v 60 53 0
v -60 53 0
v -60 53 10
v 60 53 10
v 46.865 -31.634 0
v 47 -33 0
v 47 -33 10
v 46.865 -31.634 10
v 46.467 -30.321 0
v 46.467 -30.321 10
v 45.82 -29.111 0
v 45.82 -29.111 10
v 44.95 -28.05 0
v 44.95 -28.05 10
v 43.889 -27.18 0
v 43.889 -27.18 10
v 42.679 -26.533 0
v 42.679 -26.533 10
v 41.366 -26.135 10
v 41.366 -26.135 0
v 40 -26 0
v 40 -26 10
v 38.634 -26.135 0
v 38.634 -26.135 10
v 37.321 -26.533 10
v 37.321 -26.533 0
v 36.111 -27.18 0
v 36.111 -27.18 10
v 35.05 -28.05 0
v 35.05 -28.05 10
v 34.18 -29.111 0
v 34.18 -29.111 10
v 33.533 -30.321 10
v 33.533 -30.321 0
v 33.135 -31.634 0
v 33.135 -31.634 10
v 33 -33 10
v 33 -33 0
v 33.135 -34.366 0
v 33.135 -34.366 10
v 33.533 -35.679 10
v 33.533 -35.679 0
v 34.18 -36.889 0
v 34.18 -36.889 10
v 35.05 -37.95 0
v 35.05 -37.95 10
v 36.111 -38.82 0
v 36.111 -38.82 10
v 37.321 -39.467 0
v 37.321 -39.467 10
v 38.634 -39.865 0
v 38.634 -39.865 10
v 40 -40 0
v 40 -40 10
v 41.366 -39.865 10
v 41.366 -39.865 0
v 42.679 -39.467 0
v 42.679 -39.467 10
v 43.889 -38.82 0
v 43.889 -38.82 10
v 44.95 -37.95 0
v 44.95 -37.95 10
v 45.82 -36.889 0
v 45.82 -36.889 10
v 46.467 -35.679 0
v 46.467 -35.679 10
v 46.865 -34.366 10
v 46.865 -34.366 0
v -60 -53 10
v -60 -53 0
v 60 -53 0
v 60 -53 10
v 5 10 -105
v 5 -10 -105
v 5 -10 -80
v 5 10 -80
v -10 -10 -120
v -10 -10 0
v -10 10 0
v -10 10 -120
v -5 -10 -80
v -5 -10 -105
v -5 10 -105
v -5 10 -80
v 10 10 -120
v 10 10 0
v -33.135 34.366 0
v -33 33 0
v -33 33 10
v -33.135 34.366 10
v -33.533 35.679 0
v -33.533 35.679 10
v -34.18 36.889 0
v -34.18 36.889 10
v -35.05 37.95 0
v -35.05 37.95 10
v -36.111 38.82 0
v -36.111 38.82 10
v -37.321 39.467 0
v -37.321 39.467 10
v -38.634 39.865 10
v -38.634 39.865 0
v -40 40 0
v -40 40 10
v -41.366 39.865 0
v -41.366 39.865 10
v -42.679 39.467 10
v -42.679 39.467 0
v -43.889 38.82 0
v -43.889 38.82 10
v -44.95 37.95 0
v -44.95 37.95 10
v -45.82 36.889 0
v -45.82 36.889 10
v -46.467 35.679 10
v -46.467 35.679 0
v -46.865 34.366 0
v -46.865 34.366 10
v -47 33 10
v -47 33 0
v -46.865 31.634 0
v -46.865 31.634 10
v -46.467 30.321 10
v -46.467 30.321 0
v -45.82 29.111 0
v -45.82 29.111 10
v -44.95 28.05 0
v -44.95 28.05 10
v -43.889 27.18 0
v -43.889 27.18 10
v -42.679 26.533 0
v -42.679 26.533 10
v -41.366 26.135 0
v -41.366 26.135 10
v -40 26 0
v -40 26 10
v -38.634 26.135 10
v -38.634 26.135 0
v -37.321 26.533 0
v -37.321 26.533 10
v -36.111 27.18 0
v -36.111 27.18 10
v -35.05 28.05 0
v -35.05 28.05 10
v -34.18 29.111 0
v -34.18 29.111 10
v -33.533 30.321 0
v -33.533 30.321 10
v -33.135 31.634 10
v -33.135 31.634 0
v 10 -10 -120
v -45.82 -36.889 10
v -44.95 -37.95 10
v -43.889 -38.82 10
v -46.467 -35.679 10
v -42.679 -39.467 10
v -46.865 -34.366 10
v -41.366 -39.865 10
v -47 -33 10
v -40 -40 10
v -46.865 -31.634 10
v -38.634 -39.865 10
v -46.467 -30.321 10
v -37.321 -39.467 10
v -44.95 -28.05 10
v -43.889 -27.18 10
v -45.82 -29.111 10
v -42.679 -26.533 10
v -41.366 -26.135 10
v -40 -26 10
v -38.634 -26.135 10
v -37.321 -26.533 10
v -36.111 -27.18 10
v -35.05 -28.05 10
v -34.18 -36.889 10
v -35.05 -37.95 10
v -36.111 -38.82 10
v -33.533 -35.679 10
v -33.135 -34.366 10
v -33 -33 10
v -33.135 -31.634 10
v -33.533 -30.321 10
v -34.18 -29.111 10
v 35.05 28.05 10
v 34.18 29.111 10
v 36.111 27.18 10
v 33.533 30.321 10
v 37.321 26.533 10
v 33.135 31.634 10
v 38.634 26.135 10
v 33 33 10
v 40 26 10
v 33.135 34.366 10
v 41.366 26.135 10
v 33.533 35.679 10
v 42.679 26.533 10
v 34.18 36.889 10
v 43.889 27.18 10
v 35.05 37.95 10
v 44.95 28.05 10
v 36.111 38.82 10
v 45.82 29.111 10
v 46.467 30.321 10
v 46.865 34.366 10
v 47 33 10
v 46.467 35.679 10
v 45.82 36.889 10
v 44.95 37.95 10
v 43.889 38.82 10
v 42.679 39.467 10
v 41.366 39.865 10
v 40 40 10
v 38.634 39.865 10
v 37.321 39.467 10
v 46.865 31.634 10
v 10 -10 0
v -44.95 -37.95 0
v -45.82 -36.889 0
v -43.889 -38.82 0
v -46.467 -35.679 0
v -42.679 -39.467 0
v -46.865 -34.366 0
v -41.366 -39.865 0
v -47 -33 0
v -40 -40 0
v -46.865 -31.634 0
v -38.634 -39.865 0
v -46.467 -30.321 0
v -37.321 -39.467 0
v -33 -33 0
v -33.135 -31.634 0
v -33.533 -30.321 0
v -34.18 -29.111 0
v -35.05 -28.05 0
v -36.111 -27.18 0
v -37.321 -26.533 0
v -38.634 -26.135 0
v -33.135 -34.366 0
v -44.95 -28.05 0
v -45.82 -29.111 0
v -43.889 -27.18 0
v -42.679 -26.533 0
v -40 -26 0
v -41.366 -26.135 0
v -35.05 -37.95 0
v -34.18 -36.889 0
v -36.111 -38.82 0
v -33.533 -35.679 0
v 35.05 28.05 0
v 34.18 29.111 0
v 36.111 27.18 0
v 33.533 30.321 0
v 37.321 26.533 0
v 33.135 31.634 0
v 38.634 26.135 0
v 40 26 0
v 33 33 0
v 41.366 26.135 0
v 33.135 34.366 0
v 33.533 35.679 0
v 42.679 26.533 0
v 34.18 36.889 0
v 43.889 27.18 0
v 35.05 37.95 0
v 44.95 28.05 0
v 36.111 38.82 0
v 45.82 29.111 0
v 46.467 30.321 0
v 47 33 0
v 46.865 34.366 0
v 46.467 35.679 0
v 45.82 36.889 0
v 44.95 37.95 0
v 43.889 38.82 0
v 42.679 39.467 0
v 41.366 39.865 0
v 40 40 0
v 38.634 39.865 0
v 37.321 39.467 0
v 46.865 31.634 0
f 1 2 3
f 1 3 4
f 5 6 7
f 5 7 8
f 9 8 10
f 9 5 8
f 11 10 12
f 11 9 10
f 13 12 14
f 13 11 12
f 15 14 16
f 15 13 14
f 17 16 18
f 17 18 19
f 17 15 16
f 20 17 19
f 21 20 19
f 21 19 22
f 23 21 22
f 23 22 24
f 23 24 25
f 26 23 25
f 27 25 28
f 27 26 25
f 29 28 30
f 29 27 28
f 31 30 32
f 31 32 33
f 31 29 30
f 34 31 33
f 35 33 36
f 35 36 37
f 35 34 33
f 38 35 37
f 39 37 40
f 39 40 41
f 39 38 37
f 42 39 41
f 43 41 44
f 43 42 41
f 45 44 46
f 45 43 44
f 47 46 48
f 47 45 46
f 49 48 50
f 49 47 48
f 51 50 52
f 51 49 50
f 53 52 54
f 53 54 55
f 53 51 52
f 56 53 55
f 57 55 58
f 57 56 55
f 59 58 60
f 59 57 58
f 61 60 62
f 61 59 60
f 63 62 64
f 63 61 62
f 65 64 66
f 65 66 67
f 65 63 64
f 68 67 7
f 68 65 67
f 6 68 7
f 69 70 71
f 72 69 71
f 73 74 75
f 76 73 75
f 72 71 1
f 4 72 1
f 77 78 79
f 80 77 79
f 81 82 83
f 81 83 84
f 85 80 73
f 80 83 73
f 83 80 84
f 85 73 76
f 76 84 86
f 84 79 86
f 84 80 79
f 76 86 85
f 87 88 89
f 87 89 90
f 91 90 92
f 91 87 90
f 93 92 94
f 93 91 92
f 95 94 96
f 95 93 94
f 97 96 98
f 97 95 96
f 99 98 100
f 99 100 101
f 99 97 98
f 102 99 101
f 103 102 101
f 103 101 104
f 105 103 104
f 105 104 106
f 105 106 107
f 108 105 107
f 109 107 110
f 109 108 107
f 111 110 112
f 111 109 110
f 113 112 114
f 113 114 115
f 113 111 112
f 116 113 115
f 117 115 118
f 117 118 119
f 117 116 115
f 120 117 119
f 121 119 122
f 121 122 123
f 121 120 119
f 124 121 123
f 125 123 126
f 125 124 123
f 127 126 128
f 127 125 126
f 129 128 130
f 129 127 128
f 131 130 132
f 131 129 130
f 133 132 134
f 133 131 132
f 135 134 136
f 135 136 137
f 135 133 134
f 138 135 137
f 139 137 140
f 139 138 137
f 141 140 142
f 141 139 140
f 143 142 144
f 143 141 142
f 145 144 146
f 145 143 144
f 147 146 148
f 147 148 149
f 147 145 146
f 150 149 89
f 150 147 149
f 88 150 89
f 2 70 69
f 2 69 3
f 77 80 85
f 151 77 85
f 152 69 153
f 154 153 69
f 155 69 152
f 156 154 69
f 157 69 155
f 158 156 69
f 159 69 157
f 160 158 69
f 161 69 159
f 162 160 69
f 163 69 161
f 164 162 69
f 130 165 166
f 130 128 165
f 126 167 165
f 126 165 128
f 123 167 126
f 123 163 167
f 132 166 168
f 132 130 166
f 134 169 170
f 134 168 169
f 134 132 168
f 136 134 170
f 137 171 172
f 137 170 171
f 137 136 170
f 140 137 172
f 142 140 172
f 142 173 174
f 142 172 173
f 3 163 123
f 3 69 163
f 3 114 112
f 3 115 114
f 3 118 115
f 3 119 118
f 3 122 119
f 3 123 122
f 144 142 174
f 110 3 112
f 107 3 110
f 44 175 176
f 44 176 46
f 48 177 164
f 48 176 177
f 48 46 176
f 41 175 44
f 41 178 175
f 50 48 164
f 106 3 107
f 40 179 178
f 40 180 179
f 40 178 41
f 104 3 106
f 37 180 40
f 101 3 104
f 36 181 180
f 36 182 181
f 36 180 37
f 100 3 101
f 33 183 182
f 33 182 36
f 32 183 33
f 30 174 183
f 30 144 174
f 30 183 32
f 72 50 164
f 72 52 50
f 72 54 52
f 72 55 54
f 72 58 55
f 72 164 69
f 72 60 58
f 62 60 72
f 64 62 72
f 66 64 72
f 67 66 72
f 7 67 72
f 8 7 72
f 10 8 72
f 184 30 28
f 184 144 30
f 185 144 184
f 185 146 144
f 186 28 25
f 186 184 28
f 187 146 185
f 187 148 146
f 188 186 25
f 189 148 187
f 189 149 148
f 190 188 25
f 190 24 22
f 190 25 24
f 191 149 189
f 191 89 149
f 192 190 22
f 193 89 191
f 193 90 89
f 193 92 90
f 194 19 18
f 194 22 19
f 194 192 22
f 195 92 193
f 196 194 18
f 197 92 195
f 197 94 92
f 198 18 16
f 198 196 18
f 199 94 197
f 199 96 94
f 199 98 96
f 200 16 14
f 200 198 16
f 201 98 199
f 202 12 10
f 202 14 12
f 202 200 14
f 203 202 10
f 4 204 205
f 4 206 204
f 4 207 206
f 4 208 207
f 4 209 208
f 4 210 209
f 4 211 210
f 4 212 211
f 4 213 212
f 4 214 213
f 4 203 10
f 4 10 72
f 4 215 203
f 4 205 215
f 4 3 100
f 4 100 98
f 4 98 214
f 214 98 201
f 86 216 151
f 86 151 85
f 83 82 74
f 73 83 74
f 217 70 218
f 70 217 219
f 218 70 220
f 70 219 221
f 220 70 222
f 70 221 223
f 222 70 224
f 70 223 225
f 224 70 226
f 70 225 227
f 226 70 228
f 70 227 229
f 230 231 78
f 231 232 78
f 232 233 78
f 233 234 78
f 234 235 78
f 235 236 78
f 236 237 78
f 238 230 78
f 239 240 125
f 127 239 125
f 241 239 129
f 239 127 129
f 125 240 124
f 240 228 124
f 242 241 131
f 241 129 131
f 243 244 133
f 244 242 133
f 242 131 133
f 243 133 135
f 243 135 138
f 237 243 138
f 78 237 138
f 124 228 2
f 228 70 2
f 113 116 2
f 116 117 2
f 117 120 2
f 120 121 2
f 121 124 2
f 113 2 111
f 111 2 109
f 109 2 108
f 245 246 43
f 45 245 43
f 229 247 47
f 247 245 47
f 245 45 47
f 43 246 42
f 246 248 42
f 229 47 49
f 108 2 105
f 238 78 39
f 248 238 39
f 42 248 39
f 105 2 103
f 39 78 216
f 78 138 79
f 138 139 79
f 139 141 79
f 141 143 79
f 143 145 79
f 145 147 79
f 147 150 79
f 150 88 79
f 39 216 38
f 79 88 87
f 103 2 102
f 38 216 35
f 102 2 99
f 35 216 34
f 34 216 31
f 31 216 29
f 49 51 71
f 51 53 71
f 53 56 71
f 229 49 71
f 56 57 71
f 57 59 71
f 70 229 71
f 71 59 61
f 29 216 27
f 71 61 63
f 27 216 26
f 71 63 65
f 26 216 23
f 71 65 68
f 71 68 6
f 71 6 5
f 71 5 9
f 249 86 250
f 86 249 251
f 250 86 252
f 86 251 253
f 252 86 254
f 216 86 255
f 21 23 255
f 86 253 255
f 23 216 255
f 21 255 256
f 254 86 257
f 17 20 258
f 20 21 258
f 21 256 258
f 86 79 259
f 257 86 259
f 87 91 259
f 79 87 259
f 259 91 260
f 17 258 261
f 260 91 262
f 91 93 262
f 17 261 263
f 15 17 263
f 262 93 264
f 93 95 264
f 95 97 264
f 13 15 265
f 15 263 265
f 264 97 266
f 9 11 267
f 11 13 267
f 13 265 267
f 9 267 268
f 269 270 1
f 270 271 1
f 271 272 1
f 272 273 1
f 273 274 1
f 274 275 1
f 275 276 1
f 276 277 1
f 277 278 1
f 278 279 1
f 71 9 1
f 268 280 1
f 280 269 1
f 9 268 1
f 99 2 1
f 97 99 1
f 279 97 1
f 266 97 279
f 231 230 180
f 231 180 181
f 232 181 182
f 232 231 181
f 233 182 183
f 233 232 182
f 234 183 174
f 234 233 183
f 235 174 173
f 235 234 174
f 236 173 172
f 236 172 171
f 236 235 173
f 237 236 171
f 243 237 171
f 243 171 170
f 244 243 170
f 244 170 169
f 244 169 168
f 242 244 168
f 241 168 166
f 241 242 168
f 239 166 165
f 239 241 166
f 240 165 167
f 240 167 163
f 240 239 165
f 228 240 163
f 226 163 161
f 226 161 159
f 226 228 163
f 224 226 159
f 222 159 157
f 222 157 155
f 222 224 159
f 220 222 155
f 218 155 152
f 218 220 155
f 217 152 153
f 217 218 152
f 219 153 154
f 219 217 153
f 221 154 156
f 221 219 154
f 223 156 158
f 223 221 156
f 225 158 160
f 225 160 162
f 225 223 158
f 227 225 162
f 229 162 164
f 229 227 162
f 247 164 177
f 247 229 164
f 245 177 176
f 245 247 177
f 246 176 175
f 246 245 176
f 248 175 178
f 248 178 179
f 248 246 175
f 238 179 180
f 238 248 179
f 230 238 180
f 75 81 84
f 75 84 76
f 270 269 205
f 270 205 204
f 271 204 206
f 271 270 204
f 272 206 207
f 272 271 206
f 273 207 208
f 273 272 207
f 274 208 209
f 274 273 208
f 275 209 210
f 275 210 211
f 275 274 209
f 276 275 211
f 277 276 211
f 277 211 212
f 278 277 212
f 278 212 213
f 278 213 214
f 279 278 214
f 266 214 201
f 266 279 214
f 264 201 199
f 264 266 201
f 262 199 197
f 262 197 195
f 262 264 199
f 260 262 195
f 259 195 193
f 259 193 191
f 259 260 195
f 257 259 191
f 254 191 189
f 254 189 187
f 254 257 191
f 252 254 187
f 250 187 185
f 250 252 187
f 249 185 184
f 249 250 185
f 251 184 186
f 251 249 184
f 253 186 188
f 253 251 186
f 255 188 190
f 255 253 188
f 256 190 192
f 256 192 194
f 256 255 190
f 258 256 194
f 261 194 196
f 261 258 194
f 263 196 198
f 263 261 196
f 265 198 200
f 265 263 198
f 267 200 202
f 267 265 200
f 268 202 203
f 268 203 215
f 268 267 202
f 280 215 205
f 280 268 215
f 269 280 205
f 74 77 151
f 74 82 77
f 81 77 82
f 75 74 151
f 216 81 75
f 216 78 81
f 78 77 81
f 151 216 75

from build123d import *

# Parameters (mm, degrees)
F0_W     = 20
F0_H     = 20
F2_DEPTH = 120
F0_W_2   = 120
F0_H_2   = 106
F0_R     = 7
F3_DEPTH = 10
F1_W     = 10
F1_H     = 25
F4_DEPTH = 12.5


with BuildPart() as f2:
    # F0 (on Top) → F2 (new body)
    with BuildSketch(Plane.XY):
        Rectangle(F0_W, F0_H)
    extrude(amount=-F2_DEPTH)

    # F0 (on Top) → F3 (join)
    with BuildSketch(Plane.XY):
        Rectangle(F0_W_2, F0_H_2)
        with Locations((-40, -33)):
            Circle(F0_R, mode=Mode.SUBTRACT)
        with Locations((40, -33)):
            Circle(F0_R, mode=Mode.SUBTRACT)
        with Locations((-40, 33)):
            Circle(F0_R, mode=Mode.SUBTRACT)
        Rectangle(F0_W, F0_H, mode=Mode.SUBTRACT)
        with Locations((40, 33)):
            Circle(F0_R, mode=Mode.SUBTRACT)
        Rectangle(F0_W, F0_H)
    extrude(amount=F3_DEPTH)

    # F1 (on Front) → F4 (cut, symmetric)
    with BuildSketch(Plane.XZ):
        with Locations((0, -92.5)):
            Rectangle(F1_W, F1_H)
    extrude(amount=F4_DEPTH, both=True, mode=Mode.SUBTRACT)


solid = f2.part
